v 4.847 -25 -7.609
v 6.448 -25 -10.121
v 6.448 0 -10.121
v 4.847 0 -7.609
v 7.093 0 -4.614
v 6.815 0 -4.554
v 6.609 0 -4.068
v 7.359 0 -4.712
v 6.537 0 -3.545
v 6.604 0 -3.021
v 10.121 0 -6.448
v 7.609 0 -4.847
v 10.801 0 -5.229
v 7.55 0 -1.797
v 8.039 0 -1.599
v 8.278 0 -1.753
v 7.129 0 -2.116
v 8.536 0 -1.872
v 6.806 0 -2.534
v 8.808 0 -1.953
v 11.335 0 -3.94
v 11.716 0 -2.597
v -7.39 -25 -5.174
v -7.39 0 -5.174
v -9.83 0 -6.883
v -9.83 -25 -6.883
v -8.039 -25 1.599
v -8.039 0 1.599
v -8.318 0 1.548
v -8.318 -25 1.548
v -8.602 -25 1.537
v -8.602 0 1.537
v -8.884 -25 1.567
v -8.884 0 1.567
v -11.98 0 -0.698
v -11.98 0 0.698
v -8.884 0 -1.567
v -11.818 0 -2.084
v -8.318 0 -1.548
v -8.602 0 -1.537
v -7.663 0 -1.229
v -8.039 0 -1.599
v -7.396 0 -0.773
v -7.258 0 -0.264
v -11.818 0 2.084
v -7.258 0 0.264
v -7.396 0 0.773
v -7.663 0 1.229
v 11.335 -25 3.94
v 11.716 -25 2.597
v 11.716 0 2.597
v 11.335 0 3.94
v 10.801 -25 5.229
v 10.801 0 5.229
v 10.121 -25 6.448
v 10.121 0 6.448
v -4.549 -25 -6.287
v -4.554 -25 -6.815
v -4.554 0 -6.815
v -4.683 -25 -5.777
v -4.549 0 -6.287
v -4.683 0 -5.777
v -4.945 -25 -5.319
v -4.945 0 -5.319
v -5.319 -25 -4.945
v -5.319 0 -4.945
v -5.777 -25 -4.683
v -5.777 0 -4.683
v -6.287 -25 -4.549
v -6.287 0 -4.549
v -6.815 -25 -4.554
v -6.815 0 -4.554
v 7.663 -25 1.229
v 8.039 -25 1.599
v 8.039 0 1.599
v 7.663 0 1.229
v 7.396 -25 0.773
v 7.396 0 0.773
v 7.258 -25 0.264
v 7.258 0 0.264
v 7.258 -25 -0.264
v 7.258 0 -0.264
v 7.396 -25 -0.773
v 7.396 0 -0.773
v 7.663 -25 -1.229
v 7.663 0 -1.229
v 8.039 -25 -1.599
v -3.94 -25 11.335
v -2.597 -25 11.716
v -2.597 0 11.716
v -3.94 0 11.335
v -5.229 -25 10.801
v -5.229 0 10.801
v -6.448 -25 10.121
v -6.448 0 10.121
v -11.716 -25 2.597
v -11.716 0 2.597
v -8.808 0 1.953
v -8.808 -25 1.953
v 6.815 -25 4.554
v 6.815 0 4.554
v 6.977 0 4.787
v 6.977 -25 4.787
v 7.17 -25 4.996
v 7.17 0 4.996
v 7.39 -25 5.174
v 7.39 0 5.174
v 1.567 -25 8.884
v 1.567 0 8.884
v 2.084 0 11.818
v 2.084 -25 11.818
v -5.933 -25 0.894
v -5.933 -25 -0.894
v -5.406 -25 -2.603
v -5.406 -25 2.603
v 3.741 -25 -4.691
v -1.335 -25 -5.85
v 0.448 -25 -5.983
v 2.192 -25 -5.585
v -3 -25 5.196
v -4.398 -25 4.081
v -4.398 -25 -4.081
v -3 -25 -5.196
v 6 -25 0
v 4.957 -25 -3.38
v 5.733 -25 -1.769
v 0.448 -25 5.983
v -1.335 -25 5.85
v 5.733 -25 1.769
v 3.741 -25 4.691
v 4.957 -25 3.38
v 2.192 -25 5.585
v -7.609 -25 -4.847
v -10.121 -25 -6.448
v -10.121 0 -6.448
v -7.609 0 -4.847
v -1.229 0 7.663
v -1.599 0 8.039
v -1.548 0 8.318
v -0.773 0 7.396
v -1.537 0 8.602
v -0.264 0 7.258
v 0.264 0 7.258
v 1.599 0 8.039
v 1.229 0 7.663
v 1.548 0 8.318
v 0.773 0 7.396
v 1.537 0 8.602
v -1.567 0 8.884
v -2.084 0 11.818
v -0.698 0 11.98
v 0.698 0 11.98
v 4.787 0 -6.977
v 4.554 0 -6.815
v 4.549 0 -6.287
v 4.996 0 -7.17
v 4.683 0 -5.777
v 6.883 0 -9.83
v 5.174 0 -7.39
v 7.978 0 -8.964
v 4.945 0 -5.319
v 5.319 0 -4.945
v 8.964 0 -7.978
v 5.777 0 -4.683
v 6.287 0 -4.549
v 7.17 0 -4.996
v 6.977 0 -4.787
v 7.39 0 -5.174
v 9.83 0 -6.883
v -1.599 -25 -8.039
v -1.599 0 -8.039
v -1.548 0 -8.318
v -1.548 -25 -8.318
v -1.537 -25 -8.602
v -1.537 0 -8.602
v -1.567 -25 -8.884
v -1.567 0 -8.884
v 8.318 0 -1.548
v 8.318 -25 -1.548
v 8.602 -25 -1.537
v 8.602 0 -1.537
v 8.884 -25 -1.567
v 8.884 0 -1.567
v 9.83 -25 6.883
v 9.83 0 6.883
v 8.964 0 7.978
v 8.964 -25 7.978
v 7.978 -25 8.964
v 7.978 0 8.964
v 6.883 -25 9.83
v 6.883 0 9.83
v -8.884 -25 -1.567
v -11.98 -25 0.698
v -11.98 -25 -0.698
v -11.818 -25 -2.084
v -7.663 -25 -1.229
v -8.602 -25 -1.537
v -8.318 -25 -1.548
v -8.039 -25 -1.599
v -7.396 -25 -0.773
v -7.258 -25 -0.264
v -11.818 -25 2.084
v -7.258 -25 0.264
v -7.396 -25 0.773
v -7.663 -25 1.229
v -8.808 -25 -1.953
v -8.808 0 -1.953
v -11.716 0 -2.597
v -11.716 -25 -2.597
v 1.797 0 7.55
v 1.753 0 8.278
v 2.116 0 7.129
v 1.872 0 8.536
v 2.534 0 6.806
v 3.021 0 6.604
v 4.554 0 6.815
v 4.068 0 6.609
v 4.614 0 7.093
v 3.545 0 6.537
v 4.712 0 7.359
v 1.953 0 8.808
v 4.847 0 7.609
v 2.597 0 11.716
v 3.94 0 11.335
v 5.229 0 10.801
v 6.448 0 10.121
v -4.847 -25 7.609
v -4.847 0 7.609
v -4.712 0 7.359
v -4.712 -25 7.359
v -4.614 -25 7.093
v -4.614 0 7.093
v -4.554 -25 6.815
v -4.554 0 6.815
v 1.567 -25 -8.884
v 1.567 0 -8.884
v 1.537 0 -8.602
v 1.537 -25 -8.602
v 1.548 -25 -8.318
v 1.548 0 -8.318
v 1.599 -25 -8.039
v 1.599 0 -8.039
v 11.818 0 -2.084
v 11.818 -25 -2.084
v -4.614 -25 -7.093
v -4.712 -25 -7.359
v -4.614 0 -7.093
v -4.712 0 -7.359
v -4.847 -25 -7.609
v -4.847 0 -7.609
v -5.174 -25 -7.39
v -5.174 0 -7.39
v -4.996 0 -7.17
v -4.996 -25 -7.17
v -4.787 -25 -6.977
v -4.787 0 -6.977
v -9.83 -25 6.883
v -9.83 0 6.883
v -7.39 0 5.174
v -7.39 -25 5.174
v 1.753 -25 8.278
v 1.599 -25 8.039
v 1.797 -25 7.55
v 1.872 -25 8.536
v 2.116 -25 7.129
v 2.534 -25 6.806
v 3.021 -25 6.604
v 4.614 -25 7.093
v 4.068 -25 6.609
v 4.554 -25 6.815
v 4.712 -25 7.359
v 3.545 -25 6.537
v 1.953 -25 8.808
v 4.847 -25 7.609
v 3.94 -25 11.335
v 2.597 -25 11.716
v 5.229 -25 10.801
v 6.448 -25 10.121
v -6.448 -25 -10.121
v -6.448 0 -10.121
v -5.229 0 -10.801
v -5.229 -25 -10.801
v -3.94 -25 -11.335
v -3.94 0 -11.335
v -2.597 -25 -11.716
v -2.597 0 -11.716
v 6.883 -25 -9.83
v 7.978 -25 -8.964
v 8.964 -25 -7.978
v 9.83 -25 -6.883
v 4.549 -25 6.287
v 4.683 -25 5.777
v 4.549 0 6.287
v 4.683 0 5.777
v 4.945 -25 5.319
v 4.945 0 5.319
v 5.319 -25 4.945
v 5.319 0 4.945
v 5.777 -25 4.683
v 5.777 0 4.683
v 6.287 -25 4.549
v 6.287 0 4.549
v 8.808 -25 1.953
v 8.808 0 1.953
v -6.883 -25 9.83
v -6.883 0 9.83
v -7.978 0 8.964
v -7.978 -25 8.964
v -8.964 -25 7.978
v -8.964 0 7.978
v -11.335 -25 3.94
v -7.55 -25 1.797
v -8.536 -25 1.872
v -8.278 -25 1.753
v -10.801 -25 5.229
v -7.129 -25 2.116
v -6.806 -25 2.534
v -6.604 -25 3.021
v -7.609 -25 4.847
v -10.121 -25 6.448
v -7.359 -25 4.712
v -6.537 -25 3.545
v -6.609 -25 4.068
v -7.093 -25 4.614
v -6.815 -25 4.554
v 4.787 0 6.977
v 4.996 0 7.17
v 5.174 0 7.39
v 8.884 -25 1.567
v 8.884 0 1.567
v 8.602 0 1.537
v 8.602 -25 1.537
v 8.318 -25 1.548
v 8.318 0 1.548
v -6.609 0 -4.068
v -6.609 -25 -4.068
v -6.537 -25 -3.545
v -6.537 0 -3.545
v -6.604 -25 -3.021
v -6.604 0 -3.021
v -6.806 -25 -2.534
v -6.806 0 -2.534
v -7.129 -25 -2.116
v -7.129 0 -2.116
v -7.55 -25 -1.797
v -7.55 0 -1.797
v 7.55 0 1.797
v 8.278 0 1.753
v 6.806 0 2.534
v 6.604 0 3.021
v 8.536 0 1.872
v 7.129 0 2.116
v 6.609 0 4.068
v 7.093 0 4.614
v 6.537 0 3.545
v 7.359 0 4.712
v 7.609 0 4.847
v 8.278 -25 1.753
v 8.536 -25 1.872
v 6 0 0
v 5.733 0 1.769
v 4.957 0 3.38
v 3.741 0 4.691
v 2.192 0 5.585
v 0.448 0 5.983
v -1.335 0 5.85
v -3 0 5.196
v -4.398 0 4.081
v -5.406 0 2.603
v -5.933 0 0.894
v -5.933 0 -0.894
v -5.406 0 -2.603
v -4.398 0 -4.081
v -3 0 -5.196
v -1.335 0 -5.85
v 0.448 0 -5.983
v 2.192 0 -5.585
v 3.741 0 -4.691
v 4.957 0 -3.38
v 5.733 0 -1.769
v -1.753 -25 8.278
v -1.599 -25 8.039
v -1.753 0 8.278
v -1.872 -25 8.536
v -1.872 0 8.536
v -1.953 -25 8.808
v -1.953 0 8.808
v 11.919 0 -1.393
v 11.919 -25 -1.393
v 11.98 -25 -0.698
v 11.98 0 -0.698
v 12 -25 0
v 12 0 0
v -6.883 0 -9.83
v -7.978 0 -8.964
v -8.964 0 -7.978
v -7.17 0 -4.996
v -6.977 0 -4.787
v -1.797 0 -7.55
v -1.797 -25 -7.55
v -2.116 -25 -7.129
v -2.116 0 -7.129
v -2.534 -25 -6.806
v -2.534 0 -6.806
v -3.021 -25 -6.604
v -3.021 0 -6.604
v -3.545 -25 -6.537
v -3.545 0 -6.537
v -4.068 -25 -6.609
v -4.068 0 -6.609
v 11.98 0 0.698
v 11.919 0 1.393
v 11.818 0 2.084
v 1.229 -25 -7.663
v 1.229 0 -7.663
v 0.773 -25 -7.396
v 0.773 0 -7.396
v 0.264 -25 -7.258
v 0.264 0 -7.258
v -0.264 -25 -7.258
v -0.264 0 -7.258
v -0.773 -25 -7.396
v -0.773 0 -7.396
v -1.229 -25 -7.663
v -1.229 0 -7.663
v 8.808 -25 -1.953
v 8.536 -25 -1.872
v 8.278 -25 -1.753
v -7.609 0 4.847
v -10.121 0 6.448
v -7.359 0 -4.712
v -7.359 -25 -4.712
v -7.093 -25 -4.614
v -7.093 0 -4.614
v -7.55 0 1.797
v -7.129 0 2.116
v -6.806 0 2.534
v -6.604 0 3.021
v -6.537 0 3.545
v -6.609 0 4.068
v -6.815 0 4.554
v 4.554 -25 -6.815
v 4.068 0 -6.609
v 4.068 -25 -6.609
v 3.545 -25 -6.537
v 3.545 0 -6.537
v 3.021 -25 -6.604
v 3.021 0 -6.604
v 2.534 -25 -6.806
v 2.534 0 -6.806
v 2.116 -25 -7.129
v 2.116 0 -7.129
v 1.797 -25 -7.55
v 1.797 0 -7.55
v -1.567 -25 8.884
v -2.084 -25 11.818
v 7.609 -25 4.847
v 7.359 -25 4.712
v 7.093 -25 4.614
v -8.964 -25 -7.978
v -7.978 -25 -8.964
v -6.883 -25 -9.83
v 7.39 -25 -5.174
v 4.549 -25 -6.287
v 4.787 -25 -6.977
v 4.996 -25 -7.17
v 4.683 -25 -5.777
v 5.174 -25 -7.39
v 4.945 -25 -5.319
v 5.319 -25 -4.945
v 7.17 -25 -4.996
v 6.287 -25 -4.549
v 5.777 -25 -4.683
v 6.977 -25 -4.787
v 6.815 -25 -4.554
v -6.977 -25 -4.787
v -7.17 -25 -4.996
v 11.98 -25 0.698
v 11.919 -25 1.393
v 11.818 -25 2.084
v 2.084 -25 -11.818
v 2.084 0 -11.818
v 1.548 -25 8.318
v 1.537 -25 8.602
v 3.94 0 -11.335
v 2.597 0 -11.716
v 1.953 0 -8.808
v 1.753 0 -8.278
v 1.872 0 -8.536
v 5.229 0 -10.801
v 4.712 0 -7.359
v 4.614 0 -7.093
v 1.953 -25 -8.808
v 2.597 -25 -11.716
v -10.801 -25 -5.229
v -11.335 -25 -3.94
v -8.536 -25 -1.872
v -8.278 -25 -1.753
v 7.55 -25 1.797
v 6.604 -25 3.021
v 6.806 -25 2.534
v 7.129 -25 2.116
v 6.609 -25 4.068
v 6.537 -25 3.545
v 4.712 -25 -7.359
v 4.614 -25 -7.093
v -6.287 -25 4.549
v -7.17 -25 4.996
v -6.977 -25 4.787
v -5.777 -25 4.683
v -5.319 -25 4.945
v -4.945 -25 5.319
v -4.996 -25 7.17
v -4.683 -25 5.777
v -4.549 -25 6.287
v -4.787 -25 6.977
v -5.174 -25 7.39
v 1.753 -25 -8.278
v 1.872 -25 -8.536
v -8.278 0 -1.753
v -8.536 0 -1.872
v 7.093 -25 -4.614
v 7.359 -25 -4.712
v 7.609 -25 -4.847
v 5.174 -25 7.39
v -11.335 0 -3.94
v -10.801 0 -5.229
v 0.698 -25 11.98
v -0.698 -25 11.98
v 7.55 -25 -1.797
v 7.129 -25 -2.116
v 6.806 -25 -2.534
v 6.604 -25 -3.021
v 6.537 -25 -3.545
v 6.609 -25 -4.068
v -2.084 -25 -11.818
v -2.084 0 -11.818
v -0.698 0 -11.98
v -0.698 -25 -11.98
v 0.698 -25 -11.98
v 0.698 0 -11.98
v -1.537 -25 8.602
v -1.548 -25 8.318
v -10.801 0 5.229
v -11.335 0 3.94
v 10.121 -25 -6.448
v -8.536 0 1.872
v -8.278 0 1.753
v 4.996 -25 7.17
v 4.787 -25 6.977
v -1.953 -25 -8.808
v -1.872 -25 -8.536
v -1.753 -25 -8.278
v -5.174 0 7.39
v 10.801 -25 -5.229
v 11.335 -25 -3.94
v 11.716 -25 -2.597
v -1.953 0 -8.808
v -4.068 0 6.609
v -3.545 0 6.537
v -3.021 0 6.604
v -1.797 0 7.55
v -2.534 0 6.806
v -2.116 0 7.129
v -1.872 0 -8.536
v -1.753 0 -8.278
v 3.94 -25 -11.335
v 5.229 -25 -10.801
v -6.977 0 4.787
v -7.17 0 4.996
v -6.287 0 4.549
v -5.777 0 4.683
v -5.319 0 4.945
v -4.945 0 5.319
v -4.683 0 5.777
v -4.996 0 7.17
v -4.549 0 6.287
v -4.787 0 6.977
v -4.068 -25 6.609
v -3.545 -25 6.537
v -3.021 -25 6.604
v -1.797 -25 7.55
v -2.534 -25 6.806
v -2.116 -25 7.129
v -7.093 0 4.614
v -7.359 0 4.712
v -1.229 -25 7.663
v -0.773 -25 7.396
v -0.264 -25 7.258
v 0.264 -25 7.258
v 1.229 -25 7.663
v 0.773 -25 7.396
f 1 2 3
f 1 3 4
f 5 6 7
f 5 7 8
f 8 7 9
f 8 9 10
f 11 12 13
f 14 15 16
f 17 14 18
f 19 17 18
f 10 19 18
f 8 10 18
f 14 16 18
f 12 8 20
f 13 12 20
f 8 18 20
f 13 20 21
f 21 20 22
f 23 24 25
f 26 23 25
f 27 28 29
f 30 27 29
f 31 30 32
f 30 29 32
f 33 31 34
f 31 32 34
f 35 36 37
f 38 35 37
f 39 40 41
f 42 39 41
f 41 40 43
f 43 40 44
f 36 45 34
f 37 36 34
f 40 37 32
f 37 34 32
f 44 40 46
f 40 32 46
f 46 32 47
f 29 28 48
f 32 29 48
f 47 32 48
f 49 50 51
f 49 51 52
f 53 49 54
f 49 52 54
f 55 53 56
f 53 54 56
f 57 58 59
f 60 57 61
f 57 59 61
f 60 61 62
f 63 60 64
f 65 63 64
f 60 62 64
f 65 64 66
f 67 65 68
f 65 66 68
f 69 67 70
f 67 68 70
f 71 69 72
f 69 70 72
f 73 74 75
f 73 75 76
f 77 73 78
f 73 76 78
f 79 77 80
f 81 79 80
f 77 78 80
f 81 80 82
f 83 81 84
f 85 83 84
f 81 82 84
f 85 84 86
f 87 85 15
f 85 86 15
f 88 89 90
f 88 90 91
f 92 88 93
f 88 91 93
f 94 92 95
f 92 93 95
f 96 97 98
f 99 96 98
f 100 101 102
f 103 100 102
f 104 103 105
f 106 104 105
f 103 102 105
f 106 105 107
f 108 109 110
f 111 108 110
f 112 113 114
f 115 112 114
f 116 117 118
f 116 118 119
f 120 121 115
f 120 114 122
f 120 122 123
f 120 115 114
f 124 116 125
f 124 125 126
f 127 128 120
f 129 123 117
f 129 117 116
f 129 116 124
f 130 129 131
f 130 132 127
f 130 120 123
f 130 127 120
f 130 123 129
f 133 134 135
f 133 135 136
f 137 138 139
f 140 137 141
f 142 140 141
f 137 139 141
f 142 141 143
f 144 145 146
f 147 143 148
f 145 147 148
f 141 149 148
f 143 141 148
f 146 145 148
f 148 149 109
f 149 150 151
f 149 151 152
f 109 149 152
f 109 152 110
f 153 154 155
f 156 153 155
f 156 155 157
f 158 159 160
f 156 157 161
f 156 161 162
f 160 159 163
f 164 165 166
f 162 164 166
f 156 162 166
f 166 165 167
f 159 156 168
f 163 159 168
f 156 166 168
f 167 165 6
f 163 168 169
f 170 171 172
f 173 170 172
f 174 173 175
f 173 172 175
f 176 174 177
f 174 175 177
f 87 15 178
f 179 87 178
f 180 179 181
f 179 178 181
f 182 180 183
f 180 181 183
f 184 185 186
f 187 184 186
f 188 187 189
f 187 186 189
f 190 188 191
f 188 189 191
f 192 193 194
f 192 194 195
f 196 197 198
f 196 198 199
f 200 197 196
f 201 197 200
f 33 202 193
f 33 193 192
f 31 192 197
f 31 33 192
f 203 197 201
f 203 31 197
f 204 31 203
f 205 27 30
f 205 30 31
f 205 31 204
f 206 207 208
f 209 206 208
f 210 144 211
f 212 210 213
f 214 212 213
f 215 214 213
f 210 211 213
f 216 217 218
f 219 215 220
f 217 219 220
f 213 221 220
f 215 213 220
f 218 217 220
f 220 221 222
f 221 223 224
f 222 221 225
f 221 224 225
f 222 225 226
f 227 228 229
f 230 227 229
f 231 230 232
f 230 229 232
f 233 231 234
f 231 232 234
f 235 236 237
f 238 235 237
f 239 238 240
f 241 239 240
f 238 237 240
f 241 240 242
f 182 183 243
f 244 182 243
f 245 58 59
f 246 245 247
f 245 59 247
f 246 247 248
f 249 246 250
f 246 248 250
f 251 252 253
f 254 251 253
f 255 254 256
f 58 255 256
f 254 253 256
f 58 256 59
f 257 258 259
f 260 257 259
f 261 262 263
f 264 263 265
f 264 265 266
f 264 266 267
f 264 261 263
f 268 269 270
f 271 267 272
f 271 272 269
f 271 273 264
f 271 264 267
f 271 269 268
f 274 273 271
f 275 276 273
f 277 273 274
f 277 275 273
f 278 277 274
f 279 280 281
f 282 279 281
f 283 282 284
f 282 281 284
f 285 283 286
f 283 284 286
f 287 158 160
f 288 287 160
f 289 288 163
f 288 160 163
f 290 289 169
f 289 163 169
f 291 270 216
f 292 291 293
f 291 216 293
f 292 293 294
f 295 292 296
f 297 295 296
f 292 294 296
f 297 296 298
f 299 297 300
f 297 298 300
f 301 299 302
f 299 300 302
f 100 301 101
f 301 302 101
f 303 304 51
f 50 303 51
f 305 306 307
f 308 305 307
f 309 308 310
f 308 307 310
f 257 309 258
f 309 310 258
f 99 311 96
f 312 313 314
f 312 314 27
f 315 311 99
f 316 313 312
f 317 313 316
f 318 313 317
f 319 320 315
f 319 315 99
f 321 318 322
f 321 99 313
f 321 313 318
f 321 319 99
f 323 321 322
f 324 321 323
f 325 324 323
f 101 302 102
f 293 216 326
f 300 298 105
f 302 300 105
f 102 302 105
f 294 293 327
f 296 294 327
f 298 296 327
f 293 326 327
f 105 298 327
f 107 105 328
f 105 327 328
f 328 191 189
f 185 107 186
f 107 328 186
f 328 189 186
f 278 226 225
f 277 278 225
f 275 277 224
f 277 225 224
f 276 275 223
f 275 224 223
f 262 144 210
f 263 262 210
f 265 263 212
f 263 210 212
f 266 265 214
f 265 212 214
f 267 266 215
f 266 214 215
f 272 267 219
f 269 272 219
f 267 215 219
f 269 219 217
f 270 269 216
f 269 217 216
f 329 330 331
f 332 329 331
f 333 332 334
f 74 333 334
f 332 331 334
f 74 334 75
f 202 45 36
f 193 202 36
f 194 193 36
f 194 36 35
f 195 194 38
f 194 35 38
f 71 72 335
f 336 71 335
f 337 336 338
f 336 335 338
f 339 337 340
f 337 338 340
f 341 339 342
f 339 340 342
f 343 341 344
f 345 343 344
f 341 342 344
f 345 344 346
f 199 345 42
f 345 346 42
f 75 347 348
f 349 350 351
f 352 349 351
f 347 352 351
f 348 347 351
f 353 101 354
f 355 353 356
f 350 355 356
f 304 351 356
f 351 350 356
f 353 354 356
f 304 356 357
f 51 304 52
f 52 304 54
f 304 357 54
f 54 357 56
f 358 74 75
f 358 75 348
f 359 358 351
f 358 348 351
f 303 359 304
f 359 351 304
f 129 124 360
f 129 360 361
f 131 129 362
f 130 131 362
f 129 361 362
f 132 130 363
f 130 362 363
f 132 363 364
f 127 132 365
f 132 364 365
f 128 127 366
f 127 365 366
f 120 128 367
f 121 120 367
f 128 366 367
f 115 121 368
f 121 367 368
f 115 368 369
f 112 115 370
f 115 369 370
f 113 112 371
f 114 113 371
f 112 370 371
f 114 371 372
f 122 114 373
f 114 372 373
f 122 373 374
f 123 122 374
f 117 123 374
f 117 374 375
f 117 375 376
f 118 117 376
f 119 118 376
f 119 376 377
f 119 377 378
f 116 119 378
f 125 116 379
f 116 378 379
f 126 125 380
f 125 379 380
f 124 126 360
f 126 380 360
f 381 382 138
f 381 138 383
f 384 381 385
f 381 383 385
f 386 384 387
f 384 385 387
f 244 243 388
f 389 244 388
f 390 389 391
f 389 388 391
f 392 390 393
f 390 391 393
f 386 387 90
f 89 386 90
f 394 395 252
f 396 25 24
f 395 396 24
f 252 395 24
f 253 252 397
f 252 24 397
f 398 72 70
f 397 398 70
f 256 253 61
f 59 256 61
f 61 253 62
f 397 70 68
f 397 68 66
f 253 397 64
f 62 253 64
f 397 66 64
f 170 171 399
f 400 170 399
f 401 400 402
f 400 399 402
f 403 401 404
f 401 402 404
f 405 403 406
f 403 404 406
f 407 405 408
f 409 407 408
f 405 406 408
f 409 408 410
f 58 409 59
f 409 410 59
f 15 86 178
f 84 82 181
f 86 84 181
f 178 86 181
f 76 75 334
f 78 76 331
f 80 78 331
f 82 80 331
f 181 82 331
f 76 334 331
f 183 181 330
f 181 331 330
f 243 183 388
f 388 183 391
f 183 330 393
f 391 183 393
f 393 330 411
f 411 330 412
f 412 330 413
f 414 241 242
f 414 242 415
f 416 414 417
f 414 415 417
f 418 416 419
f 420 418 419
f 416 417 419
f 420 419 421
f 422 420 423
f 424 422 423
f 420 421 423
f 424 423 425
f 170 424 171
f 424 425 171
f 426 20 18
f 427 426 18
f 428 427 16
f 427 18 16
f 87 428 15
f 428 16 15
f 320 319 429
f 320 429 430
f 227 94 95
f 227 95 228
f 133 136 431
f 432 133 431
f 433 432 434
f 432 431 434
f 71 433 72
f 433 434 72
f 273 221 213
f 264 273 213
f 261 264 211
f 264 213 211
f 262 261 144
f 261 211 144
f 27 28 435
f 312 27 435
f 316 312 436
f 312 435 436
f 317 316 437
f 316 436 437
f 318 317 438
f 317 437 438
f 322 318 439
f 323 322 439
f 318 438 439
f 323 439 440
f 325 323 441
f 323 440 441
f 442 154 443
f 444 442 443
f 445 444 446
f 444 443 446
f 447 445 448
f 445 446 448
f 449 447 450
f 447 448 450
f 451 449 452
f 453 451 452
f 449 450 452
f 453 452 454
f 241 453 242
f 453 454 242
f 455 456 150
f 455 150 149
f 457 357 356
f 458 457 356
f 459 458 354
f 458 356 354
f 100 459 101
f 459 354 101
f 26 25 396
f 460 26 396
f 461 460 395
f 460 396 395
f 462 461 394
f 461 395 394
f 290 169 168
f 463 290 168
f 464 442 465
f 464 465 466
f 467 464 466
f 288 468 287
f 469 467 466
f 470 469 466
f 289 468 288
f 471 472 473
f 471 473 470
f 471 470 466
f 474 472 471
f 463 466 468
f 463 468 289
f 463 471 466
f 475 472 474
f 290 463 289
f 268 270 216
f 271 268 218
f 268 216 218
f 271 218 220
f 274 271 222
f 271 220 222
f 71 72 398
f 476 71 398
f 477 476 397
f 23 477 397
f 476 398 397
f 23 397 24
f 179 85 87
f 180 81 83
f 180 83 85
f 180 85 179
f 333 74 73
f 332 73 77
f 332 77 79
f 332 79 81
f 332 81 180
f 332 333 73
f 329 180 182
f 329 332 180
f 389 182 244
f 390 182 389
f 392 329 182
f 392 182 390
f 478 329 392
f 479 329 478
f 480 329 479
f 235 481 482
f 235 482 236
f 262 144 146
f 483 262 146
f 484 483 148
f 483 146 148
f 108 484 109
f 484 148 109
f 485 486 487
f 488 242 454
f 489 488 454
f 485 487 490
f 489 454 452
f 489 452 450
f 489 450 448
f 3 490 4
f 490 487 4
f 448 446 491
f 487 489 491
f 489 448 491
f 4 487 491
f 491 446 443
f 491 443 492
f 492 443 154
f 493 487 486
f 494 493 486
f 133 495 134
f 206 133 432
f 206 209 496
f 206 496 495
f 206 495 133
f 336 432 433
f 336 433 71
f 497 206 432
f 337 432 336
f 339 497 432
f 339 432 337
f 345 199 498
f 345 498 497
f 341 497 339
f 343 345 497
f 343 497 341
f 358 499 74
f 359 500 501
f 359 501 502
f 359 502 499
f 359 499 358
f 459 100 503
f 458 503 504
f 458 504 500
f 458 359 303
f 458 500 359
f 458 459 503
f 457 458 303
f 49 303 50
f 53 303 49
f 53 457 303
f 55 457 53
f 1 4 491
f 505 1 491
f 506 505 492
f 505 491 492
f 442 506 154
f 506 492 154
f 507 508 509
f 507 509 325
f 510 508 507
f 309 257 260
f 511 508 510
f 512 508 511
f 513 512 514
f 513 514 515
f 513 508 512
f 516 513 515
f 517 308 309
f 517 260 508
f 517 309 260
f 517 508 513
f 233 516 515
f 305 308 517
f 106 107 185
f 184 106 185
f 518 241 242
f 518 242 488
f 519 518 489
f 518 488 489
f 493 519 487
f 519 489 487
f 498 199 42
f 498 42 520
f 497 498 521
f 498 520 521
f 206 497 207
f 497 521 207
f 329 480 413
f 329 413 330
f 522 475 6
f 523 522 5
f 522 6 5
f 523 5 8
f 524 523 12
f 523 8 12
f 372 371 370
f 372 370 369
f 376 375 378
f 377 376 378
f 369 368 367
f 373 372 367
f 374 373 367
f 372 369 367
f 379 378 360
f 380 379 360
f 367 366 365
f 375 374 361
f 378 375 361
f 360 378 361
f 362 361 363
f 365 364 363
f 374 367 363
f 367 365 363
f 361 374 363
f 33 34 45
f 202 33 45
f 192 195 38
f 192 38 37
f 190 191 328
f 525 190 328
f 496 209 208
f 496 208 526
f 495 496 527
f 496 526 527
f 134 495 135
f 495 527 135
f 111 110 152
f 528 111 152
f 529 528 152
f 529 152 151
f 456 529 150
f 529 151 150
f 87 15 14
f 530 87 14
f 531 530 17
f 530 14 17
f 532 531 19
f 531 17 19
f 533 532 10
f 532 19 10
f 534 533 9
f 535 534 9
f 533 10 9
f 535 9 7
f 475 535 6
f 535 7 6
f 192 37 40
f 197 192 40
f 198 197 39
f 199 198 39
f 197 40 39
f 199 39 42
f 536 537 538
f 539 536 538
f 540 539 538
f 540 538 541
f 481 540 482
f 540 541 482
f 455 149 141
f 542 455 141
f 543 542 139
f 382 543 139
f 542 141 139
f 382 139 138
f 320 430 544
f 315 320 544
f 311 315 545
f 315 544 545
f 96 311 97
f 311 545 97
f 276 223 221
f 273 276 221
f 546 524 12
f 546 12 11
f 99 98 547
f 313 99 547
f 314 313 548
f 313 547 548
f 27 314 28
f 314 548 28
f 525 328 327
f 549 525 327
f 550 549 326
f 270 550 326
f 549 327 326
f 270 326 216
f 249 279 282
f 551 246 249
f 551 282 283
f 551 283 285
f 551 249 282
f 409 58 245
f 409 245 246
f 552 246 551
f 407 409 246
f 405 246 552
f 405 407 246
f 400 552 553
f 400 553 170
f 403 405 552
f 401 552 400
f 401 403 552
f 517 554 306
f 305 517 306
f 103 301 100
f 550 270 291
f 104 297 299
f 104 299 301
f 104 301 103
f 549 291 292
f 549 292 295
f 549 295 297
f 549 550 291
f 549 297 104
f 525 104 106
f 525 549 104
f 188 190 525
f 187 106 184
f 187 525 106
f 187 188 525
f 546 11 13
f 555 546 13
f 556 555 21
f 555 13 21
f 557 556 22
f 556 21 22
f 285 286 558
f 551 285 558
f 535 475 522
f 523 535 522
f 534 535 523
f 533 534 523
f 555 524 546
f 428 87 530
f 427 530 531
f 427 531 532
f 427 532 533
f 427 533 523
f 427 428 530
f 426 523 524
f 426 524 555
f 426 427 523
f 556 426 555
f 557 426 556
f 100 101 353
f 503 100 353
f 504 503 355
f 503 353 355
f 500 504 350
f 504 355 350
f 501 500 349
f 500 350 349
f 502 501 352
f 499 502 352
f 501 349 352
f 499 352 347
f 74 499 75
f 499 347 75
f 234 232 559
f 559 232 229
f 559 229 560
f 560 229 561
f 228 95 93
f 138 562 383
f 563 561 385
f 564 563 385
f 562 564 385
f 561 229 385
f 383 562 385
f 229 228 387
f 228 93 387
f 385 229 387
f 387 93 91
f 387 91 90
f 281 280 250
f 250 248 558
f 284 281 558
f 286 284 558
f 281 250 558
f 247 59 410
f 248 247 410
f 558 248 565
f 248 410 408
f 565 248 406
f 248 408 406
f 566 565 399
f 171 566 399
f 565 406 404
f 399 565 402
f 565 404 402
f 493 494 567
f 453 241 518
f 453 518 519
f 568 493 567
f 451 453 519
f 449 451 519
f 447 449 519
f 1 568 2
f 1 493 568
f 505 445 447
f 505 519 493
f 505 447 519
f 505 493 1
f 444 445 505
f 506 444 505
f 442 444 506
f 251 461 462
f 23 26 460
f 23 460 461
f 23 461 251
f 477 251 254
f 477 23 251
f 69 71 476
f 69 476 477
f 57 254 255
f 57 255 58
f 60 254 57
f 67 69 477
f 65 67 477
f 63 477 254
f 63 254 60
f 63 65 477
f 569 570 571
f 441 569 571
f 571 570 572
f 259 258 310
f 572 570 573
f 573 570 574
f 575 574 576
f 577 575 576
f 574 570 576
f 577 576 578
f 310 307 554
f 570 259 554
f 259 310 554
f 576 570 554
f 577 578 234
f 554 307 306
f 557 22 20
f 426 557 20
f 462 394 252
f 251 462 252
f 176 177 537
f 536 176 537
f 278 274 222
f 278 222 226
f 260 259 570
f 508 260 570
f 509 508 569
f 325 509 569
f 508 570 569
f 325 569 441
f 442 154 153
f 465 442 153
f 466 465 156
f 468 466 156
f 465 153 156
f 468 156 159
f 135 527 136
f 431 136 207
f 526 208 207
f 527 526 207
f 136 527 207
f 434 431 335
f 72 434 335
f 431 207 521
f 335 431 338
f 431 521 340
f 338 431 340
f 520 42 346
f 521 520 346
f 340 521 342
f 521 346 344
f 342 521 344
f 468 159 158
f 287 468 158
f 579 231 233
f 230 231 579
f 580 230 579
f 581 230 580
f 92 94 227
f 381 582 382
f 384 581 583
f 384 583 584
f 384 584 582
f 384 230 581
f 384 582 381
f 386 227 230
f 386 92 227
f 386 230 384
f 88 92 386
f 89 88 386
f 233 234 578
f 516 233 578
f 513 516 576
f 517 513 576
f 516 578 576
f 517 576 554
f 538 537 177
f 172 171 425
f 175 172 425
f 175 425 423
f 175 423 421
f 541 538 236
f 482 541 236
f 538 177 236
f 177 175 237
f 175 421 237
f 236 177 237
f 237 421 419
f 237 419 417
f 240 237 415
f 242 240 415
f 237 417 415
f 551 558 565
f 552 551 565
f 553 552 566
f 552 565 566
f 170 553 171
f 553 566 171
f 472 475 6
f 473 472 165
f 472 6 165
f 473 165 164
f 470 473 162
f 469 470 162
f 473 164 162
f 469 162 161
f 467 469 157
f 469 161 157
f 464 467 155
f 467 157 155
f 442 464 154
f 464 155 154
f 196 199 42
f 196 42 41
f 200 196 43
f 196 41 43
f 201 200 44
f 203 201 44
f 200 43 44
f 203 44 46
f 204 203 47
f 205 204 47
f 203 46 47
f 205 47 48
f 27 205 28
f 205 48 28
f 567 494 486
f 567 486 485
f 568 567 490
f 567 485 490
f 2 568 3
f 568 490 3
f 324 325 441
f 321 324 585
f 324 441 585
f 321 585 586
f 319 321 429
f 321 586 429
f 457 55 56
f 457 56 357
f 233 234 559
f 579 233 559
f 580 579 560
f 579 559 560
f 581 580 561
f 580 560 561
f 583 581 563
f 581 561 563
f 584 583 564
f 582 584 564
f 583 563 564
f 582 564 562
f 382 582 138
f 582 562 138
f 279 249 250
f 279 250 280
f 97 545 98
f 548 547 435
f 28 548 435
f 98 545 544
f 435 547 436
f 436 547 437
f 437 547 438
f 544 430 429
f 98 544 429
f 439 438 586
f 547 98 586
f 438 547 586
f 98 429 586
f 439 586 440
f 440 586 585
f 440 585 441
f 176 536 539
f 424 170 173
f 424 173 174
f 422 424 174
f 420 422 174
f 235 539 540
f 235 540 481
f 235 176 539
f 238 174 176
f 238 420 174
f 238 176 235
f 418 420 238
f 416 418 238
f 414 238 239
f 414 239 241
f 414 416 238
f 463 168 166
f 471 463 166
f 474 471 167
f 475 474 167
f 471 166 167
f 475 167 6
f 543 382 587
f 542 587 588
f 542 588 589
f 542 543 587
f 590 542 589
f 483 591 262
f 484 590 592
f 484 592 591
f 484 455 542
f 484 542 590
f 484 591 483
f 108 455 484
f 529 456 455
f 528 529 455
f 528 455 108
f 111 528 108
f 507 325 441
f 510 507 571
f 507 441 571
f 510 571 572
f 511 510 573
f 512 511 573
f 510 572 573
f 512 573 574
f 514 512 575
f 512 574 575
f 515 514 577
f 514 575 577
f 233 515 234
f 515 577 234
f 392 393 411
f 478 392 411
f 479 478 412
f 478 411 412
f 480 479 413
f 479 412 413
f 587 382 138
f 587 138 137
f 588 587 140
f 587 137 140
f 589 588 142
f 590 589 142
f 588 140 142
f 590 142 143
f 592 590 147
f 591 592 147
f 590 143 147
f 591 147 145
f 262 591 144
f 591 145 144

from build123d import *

# Parameters (mm, degrees)
F0_R     = 6
F1_DEPTH = 25


with BuildPart() as f1:
    # F0 (on Front) → F1 (new body)
    with BuildSketch(Plane.XZ):
        with BuildLine():
            ThreePointArc((-4.553878, 6.815361), (-2.770801, 6.689306), (-1.599109, 8.039266))
            ThreePointArc((-1.599109, 8.039266), (-1.816926, 8.404522), (-1.952592, 8.807573))
            Line((-1.952592, 8.807573), (-2.597275, 11.715552))
            ThreePointArc((-2.597275, 11.715552), (-4.592201, 11.086554), (-6.447595, 10.120697))
            Line((-6.447595, 10.120697), (-4.847204, 7.608586))
            ThreePointArc((-4.847204, 7.608586), (-4.658134, 7.227655), (-4.553878, 6.815361))
        make_face()
        with BuildLine():
            ThreePointArc((-1.599109, 8.039266), (0, 7.240453), (1.599109, 8.039266))
            ThreePointArc((1.599109, 8.039266), (1.537651, 8.460073), (1.566553, 8.884361))
            Line((1.566553, 8.884361), (2.083778, 11.817693))
            ThreePointArc((2.083778, 11.817693), (0, 12), (-2.083778, 11.817693))
            Line((-2.083778, 11.817693), (-1.566553, 8.884361))
            ThreePointArc((-1.566553, 8.884361), (-1.537651, 8.460073), (-1.599109, 8.039266))
        make_face()
        with BuildLine():
            ThreePointArc((1.599109, 8.039266), (2.770801, 6.689306), (4.553878, 6.815361))
            ThreePointArc((4.553878, 6.815361), (4.658134, 7.227655), (4.847204, 7.608586))
            Line((4.847204, 7.608586), (6.447595, 10.120697))
            ThreePointArc((6.447595, 10.120697), (4.592201, 11.086554), (2.597275, 11.715552))
            Line((2.597275, 11.715552), (1.952592, 8.807573))
            ThreePointArc((1.952592, 8.807573), (1.816926, 8.404522), (1.599109, 8.039266))
        make_face()
        with BuildLine():
            Line((7.389912, 5.174472), (9.829825, 6.882917))
            ThreePointArc((9.829825, 6.882917), (8.485281, 8.485281), (6.882917, 9.829825))
            Line((6.882917, 9.829825), (5.174472, 7.389912))
            ThreePointArc((5.174472, 7.389912), (4.894892, 7.069458), (4.553878, 6.815361))
            ThreePointArc((4.553878, 6.815361), (5.119773, 5.119773), (6.815361, 4.553878))
            ThreePointArc((6.815361, 4.553878), (7.069458, 4.894892), (7.389912, 5.174472))
        make_face()
        with BuildLine():
            Line((8.807573, 1.952592), (11.715552, 2.597275))
            ThreePointArc((11.715552, 2.597275), (11.086554, 4.592201), (10.120697, 6.447595))
            Line((10.120697, 6.447595), (7.608586, 4.847204))
            ThreePointArc((7.608586, 4.847204), (7.227655, 4.658134), (6.815361, 4.553878))
            ThreePointArc((6.815361, 4.553878), (6.689306, 2.770801), (8.039266, 1.599109))
            ThreePointArc((8.039266, 1.599109), (8.404522, 1.816926), (8.807573, 1.952592))
        make_face()
        with BuildLine():
            ThreePointArc((11.817693, -2.083778), (11.954336, -1.045869), (12, 0))
            ThreePointArc((12, 0), (11.954336, 1.045869), (11.817693, 2.083778))
            Line((11.817693, 2.083778), (8.884361, 1.566553))
            ThreePointArc((8.884361, 1.566553), (8.460073, 1.537651), (8.039266, 1.599109))
            ThreePointArc((8.039266, 1.599109), (7.240453, 0), (8.039266, -1.599109))
            ThreePointArc((8.039266, -1.599109), (8.460073, -1.537651), (8.884361, -1.566553))
            Line((8.884361, -1.566553), (11.817693, -2.083778))
        make_face()
        with BuildLine():
            ThreePointArc((6.882917, -9.829825), (8.485281, -8.485281), (9.829825, -6.882917))
            Line((9.829825, -6.882917), (7.389912, -5.174472))
            ThreePointArc((7.389912, -5.174472), (7.069458, -4.894892), (6.815361, -4.553878))
            ThreePointArc((6.815361, -4.553878), (5.119773, -5.119773), (4.553878, -6.815361))
            ThreePointArc((4.553878, -6.815361), (4.894892, -7.069458), (5.174472, -7.389912))
            Line((5.174472, -7.389912), (6.882917, -9.829825))
        make_face()
        with BuildLine():
            ThreePointArc((1.566553, -8.884361), (1.537651, -8.460073), (1.599109, -8.039266))
            ThreePointArc((1.599109, -8.039266), (0, -7.240453), (-1.599109, -8.039266))
            ThreePointArc((-1.599109, -8.039266), (-1.537651, -8.460073), (-1.566553, -8.884361))
            Line((-1.566553, -8.884361), (-2.083778, -11.817693))
            ThreePointArc((-2.083778, -11.817693), (0, -12), (2.083778, -11.817693))
            Line((2.083778, -11.817693), (1.566553, -8.884361))
        make_face()
        with BuildLine():
            ThreePointArc((-1.952592, -8.807573), (-1.816926, -8.404522), (-1.599109, -8.039266))
            ThreePointArc((-1.599109, -8.039266), (-2.770801, -6.689306), (-4.553878, -6.815361))
            ThreePointArc((-4.553878, -6.815361), (-4.658134, -7.227655), (-4.847204, -7.608586))
            Line((-4.847204, -7.608586), (-6.447595, -10.120697))
            ThreePointArc((-6.447595, -10.120697), (-4.592201, -11.086554), (-2.597275, -11.715552))
            Line((-2.597275, -11.715552), (-1.952592, -8.807573))
        make_face()
        with BuildLine():
            ThreePointArc((-5.174472, -7.389912), (-4.894892, -7.069458), (-4.553878, -6.815361))
            ThreePointArc((-4.553878, -6.815361), (-5.119773, -5.119773), (-6.815361, -4.553878))
            ThreePointArc((-6.815361, -4.553878), (-7.069458, -4.894892), (-7.389912, -5.174472))
            Line((-7.389912, -5.174472), (-9.829825, -6.882917))
            ThreePointArc((-9.829825, -6.882917), (-8.485281, -8.485281), (-6.882917, -9.829825))
            Line((-6.882917, -9.829825), (-5.174472, -7.389912))
        make_face()
        with BuildLine():
            ThreePointArc((-7.608586, -4.847204), (-7.227655, -4.658134), (-6.815361, -4.553878))
            ThreePointArc((-6.815361, -4.553878), (-6.689306, -2.770801), (-8.039266, -1.599109))
            ThreePointArc((-8.039266, -1.599109), (-8.404522, -1.816926), (-8.807573, -1.952592))
            Line((-8.807573, -1.952592), (-11.715552, -2.597275))
            ThreePointArc((-11.715552, -2.597275), (-11.086554, -4.592201), (-10.120697, -6.447595))
            Line((-10.120697, -6.447595), (-7.608586, -4.847204))
        make_face()
        with BuildLine():
            ThreePointArc((-8.039266, -1.599109), (-7.240453, 0), (-8.039266, 1.599109))
            ThreePointArc((-8.039266, 1.599109), (-8.460073, 1.537651), (-8.884361, 1.566553))
            Line((-8.884361, 1.566553), (-11.817693, 2.083778))
            ThreePointArc((-11.817693, 2.083778), (-12, 0), (-11.817693, -2.083778))
            Line((-11.817693, -2.083778), (-8.884361, -1.566553))
            ThreePointArc((-8.884361, -1.566553), (-8.460073, -1.537651), (-8.039266, -1.599109))
        make_face()
        with BuildLine():
            ThreePointArc((-8.039266, 1.599109), (-6.689306, 2.770801), (-6.815361, 4.553878))
            ThreePointArc((-6.815361, 4.553878), (-7.227655, 4.658134), (-7.608586, 4.847204))
            Line((-7.608586, 4.847204), (-10.120697, 6.447595))
            ThreePointArc((-10.120697, 6.447595), (-11.086554, 4.592201), (-11.715552, 2.597275))
            Line((-11.715552, 2.597275), (-8.807573, 1.952592))
            ThreePointArc((-8.807573, 1.952592), (-8.404522, 1.816926), (-8.039266, 1.599109))
        make_face()
        with BuildLine():
            ThreePointArc((-6.815361, 4.553878), (-5.119773, 5.119773), (-4.553878, 6.815361))
            ThreePointArc((-4.553878, 6.815361), (-4.894892, 7.069458), (-5.174472, 7.389912))
            Line((-5.174472, 7.389912), (-6.882917, 9.829825))
            ThreePointArc((-6.882917, 9.829825), (-8.485281, 8.485281), (-9.829825, 6.882917))
            Line((-9.829825, 6.882917), (-7.389912, 5.174472))
            ThreePointArc((-7.389912, 5.174472), (-7.069458, 4.894892), (-6.815361, 4.553878))
        make_face()
        with BuildLine():
            ThreePointArc((4.847204, -7.608586), (4.658134, -7.227655), (4.553878, -6.815361))
            ThreePointArc((4.553878, -6.815361), (2.770801, -6.689306), (1.599109, -8.039266))
            ThreePointArc((1.599109, -8.039266), (1.816926, -8.404522), (1.952592, -8.807573))
            Line((1.952592, -8.807573), (2.597275, -11.715552))
            ThreePointArc((2.597275, -11.715552), (4.592201, -11.086554), (6.447595, -10.120697))
            Line((6.447595, -10.120697), (4.847204, -7.608586))
        make_face()
        with BuildLine():
            ThreePointArc((10.120697, -6.447595), (11.086554, -4.592201), (11.715552, -2.597275))
            Line((11.715552, -2.597275), (8.807573, -1.952592))
            ThreePointArc((8.807573, -1.952592), (8.404522, -1.816926), (8.039266, -1.599109))
            ThreePointArc((8.039266, -1.599109), (6.689306, -2.770801), (6.815361, -4.553878))
            ThreePointArc((6.815361, -4.553878), (7.227655, -4.658134), (7.608586, -4.847204))
            Line((7.608586, -4.847204), (10.120697, -6.447595))
        make_face()
        Circle(F0_R)
    extrude(amount=F1_DEPTH)


solid = f1.part
